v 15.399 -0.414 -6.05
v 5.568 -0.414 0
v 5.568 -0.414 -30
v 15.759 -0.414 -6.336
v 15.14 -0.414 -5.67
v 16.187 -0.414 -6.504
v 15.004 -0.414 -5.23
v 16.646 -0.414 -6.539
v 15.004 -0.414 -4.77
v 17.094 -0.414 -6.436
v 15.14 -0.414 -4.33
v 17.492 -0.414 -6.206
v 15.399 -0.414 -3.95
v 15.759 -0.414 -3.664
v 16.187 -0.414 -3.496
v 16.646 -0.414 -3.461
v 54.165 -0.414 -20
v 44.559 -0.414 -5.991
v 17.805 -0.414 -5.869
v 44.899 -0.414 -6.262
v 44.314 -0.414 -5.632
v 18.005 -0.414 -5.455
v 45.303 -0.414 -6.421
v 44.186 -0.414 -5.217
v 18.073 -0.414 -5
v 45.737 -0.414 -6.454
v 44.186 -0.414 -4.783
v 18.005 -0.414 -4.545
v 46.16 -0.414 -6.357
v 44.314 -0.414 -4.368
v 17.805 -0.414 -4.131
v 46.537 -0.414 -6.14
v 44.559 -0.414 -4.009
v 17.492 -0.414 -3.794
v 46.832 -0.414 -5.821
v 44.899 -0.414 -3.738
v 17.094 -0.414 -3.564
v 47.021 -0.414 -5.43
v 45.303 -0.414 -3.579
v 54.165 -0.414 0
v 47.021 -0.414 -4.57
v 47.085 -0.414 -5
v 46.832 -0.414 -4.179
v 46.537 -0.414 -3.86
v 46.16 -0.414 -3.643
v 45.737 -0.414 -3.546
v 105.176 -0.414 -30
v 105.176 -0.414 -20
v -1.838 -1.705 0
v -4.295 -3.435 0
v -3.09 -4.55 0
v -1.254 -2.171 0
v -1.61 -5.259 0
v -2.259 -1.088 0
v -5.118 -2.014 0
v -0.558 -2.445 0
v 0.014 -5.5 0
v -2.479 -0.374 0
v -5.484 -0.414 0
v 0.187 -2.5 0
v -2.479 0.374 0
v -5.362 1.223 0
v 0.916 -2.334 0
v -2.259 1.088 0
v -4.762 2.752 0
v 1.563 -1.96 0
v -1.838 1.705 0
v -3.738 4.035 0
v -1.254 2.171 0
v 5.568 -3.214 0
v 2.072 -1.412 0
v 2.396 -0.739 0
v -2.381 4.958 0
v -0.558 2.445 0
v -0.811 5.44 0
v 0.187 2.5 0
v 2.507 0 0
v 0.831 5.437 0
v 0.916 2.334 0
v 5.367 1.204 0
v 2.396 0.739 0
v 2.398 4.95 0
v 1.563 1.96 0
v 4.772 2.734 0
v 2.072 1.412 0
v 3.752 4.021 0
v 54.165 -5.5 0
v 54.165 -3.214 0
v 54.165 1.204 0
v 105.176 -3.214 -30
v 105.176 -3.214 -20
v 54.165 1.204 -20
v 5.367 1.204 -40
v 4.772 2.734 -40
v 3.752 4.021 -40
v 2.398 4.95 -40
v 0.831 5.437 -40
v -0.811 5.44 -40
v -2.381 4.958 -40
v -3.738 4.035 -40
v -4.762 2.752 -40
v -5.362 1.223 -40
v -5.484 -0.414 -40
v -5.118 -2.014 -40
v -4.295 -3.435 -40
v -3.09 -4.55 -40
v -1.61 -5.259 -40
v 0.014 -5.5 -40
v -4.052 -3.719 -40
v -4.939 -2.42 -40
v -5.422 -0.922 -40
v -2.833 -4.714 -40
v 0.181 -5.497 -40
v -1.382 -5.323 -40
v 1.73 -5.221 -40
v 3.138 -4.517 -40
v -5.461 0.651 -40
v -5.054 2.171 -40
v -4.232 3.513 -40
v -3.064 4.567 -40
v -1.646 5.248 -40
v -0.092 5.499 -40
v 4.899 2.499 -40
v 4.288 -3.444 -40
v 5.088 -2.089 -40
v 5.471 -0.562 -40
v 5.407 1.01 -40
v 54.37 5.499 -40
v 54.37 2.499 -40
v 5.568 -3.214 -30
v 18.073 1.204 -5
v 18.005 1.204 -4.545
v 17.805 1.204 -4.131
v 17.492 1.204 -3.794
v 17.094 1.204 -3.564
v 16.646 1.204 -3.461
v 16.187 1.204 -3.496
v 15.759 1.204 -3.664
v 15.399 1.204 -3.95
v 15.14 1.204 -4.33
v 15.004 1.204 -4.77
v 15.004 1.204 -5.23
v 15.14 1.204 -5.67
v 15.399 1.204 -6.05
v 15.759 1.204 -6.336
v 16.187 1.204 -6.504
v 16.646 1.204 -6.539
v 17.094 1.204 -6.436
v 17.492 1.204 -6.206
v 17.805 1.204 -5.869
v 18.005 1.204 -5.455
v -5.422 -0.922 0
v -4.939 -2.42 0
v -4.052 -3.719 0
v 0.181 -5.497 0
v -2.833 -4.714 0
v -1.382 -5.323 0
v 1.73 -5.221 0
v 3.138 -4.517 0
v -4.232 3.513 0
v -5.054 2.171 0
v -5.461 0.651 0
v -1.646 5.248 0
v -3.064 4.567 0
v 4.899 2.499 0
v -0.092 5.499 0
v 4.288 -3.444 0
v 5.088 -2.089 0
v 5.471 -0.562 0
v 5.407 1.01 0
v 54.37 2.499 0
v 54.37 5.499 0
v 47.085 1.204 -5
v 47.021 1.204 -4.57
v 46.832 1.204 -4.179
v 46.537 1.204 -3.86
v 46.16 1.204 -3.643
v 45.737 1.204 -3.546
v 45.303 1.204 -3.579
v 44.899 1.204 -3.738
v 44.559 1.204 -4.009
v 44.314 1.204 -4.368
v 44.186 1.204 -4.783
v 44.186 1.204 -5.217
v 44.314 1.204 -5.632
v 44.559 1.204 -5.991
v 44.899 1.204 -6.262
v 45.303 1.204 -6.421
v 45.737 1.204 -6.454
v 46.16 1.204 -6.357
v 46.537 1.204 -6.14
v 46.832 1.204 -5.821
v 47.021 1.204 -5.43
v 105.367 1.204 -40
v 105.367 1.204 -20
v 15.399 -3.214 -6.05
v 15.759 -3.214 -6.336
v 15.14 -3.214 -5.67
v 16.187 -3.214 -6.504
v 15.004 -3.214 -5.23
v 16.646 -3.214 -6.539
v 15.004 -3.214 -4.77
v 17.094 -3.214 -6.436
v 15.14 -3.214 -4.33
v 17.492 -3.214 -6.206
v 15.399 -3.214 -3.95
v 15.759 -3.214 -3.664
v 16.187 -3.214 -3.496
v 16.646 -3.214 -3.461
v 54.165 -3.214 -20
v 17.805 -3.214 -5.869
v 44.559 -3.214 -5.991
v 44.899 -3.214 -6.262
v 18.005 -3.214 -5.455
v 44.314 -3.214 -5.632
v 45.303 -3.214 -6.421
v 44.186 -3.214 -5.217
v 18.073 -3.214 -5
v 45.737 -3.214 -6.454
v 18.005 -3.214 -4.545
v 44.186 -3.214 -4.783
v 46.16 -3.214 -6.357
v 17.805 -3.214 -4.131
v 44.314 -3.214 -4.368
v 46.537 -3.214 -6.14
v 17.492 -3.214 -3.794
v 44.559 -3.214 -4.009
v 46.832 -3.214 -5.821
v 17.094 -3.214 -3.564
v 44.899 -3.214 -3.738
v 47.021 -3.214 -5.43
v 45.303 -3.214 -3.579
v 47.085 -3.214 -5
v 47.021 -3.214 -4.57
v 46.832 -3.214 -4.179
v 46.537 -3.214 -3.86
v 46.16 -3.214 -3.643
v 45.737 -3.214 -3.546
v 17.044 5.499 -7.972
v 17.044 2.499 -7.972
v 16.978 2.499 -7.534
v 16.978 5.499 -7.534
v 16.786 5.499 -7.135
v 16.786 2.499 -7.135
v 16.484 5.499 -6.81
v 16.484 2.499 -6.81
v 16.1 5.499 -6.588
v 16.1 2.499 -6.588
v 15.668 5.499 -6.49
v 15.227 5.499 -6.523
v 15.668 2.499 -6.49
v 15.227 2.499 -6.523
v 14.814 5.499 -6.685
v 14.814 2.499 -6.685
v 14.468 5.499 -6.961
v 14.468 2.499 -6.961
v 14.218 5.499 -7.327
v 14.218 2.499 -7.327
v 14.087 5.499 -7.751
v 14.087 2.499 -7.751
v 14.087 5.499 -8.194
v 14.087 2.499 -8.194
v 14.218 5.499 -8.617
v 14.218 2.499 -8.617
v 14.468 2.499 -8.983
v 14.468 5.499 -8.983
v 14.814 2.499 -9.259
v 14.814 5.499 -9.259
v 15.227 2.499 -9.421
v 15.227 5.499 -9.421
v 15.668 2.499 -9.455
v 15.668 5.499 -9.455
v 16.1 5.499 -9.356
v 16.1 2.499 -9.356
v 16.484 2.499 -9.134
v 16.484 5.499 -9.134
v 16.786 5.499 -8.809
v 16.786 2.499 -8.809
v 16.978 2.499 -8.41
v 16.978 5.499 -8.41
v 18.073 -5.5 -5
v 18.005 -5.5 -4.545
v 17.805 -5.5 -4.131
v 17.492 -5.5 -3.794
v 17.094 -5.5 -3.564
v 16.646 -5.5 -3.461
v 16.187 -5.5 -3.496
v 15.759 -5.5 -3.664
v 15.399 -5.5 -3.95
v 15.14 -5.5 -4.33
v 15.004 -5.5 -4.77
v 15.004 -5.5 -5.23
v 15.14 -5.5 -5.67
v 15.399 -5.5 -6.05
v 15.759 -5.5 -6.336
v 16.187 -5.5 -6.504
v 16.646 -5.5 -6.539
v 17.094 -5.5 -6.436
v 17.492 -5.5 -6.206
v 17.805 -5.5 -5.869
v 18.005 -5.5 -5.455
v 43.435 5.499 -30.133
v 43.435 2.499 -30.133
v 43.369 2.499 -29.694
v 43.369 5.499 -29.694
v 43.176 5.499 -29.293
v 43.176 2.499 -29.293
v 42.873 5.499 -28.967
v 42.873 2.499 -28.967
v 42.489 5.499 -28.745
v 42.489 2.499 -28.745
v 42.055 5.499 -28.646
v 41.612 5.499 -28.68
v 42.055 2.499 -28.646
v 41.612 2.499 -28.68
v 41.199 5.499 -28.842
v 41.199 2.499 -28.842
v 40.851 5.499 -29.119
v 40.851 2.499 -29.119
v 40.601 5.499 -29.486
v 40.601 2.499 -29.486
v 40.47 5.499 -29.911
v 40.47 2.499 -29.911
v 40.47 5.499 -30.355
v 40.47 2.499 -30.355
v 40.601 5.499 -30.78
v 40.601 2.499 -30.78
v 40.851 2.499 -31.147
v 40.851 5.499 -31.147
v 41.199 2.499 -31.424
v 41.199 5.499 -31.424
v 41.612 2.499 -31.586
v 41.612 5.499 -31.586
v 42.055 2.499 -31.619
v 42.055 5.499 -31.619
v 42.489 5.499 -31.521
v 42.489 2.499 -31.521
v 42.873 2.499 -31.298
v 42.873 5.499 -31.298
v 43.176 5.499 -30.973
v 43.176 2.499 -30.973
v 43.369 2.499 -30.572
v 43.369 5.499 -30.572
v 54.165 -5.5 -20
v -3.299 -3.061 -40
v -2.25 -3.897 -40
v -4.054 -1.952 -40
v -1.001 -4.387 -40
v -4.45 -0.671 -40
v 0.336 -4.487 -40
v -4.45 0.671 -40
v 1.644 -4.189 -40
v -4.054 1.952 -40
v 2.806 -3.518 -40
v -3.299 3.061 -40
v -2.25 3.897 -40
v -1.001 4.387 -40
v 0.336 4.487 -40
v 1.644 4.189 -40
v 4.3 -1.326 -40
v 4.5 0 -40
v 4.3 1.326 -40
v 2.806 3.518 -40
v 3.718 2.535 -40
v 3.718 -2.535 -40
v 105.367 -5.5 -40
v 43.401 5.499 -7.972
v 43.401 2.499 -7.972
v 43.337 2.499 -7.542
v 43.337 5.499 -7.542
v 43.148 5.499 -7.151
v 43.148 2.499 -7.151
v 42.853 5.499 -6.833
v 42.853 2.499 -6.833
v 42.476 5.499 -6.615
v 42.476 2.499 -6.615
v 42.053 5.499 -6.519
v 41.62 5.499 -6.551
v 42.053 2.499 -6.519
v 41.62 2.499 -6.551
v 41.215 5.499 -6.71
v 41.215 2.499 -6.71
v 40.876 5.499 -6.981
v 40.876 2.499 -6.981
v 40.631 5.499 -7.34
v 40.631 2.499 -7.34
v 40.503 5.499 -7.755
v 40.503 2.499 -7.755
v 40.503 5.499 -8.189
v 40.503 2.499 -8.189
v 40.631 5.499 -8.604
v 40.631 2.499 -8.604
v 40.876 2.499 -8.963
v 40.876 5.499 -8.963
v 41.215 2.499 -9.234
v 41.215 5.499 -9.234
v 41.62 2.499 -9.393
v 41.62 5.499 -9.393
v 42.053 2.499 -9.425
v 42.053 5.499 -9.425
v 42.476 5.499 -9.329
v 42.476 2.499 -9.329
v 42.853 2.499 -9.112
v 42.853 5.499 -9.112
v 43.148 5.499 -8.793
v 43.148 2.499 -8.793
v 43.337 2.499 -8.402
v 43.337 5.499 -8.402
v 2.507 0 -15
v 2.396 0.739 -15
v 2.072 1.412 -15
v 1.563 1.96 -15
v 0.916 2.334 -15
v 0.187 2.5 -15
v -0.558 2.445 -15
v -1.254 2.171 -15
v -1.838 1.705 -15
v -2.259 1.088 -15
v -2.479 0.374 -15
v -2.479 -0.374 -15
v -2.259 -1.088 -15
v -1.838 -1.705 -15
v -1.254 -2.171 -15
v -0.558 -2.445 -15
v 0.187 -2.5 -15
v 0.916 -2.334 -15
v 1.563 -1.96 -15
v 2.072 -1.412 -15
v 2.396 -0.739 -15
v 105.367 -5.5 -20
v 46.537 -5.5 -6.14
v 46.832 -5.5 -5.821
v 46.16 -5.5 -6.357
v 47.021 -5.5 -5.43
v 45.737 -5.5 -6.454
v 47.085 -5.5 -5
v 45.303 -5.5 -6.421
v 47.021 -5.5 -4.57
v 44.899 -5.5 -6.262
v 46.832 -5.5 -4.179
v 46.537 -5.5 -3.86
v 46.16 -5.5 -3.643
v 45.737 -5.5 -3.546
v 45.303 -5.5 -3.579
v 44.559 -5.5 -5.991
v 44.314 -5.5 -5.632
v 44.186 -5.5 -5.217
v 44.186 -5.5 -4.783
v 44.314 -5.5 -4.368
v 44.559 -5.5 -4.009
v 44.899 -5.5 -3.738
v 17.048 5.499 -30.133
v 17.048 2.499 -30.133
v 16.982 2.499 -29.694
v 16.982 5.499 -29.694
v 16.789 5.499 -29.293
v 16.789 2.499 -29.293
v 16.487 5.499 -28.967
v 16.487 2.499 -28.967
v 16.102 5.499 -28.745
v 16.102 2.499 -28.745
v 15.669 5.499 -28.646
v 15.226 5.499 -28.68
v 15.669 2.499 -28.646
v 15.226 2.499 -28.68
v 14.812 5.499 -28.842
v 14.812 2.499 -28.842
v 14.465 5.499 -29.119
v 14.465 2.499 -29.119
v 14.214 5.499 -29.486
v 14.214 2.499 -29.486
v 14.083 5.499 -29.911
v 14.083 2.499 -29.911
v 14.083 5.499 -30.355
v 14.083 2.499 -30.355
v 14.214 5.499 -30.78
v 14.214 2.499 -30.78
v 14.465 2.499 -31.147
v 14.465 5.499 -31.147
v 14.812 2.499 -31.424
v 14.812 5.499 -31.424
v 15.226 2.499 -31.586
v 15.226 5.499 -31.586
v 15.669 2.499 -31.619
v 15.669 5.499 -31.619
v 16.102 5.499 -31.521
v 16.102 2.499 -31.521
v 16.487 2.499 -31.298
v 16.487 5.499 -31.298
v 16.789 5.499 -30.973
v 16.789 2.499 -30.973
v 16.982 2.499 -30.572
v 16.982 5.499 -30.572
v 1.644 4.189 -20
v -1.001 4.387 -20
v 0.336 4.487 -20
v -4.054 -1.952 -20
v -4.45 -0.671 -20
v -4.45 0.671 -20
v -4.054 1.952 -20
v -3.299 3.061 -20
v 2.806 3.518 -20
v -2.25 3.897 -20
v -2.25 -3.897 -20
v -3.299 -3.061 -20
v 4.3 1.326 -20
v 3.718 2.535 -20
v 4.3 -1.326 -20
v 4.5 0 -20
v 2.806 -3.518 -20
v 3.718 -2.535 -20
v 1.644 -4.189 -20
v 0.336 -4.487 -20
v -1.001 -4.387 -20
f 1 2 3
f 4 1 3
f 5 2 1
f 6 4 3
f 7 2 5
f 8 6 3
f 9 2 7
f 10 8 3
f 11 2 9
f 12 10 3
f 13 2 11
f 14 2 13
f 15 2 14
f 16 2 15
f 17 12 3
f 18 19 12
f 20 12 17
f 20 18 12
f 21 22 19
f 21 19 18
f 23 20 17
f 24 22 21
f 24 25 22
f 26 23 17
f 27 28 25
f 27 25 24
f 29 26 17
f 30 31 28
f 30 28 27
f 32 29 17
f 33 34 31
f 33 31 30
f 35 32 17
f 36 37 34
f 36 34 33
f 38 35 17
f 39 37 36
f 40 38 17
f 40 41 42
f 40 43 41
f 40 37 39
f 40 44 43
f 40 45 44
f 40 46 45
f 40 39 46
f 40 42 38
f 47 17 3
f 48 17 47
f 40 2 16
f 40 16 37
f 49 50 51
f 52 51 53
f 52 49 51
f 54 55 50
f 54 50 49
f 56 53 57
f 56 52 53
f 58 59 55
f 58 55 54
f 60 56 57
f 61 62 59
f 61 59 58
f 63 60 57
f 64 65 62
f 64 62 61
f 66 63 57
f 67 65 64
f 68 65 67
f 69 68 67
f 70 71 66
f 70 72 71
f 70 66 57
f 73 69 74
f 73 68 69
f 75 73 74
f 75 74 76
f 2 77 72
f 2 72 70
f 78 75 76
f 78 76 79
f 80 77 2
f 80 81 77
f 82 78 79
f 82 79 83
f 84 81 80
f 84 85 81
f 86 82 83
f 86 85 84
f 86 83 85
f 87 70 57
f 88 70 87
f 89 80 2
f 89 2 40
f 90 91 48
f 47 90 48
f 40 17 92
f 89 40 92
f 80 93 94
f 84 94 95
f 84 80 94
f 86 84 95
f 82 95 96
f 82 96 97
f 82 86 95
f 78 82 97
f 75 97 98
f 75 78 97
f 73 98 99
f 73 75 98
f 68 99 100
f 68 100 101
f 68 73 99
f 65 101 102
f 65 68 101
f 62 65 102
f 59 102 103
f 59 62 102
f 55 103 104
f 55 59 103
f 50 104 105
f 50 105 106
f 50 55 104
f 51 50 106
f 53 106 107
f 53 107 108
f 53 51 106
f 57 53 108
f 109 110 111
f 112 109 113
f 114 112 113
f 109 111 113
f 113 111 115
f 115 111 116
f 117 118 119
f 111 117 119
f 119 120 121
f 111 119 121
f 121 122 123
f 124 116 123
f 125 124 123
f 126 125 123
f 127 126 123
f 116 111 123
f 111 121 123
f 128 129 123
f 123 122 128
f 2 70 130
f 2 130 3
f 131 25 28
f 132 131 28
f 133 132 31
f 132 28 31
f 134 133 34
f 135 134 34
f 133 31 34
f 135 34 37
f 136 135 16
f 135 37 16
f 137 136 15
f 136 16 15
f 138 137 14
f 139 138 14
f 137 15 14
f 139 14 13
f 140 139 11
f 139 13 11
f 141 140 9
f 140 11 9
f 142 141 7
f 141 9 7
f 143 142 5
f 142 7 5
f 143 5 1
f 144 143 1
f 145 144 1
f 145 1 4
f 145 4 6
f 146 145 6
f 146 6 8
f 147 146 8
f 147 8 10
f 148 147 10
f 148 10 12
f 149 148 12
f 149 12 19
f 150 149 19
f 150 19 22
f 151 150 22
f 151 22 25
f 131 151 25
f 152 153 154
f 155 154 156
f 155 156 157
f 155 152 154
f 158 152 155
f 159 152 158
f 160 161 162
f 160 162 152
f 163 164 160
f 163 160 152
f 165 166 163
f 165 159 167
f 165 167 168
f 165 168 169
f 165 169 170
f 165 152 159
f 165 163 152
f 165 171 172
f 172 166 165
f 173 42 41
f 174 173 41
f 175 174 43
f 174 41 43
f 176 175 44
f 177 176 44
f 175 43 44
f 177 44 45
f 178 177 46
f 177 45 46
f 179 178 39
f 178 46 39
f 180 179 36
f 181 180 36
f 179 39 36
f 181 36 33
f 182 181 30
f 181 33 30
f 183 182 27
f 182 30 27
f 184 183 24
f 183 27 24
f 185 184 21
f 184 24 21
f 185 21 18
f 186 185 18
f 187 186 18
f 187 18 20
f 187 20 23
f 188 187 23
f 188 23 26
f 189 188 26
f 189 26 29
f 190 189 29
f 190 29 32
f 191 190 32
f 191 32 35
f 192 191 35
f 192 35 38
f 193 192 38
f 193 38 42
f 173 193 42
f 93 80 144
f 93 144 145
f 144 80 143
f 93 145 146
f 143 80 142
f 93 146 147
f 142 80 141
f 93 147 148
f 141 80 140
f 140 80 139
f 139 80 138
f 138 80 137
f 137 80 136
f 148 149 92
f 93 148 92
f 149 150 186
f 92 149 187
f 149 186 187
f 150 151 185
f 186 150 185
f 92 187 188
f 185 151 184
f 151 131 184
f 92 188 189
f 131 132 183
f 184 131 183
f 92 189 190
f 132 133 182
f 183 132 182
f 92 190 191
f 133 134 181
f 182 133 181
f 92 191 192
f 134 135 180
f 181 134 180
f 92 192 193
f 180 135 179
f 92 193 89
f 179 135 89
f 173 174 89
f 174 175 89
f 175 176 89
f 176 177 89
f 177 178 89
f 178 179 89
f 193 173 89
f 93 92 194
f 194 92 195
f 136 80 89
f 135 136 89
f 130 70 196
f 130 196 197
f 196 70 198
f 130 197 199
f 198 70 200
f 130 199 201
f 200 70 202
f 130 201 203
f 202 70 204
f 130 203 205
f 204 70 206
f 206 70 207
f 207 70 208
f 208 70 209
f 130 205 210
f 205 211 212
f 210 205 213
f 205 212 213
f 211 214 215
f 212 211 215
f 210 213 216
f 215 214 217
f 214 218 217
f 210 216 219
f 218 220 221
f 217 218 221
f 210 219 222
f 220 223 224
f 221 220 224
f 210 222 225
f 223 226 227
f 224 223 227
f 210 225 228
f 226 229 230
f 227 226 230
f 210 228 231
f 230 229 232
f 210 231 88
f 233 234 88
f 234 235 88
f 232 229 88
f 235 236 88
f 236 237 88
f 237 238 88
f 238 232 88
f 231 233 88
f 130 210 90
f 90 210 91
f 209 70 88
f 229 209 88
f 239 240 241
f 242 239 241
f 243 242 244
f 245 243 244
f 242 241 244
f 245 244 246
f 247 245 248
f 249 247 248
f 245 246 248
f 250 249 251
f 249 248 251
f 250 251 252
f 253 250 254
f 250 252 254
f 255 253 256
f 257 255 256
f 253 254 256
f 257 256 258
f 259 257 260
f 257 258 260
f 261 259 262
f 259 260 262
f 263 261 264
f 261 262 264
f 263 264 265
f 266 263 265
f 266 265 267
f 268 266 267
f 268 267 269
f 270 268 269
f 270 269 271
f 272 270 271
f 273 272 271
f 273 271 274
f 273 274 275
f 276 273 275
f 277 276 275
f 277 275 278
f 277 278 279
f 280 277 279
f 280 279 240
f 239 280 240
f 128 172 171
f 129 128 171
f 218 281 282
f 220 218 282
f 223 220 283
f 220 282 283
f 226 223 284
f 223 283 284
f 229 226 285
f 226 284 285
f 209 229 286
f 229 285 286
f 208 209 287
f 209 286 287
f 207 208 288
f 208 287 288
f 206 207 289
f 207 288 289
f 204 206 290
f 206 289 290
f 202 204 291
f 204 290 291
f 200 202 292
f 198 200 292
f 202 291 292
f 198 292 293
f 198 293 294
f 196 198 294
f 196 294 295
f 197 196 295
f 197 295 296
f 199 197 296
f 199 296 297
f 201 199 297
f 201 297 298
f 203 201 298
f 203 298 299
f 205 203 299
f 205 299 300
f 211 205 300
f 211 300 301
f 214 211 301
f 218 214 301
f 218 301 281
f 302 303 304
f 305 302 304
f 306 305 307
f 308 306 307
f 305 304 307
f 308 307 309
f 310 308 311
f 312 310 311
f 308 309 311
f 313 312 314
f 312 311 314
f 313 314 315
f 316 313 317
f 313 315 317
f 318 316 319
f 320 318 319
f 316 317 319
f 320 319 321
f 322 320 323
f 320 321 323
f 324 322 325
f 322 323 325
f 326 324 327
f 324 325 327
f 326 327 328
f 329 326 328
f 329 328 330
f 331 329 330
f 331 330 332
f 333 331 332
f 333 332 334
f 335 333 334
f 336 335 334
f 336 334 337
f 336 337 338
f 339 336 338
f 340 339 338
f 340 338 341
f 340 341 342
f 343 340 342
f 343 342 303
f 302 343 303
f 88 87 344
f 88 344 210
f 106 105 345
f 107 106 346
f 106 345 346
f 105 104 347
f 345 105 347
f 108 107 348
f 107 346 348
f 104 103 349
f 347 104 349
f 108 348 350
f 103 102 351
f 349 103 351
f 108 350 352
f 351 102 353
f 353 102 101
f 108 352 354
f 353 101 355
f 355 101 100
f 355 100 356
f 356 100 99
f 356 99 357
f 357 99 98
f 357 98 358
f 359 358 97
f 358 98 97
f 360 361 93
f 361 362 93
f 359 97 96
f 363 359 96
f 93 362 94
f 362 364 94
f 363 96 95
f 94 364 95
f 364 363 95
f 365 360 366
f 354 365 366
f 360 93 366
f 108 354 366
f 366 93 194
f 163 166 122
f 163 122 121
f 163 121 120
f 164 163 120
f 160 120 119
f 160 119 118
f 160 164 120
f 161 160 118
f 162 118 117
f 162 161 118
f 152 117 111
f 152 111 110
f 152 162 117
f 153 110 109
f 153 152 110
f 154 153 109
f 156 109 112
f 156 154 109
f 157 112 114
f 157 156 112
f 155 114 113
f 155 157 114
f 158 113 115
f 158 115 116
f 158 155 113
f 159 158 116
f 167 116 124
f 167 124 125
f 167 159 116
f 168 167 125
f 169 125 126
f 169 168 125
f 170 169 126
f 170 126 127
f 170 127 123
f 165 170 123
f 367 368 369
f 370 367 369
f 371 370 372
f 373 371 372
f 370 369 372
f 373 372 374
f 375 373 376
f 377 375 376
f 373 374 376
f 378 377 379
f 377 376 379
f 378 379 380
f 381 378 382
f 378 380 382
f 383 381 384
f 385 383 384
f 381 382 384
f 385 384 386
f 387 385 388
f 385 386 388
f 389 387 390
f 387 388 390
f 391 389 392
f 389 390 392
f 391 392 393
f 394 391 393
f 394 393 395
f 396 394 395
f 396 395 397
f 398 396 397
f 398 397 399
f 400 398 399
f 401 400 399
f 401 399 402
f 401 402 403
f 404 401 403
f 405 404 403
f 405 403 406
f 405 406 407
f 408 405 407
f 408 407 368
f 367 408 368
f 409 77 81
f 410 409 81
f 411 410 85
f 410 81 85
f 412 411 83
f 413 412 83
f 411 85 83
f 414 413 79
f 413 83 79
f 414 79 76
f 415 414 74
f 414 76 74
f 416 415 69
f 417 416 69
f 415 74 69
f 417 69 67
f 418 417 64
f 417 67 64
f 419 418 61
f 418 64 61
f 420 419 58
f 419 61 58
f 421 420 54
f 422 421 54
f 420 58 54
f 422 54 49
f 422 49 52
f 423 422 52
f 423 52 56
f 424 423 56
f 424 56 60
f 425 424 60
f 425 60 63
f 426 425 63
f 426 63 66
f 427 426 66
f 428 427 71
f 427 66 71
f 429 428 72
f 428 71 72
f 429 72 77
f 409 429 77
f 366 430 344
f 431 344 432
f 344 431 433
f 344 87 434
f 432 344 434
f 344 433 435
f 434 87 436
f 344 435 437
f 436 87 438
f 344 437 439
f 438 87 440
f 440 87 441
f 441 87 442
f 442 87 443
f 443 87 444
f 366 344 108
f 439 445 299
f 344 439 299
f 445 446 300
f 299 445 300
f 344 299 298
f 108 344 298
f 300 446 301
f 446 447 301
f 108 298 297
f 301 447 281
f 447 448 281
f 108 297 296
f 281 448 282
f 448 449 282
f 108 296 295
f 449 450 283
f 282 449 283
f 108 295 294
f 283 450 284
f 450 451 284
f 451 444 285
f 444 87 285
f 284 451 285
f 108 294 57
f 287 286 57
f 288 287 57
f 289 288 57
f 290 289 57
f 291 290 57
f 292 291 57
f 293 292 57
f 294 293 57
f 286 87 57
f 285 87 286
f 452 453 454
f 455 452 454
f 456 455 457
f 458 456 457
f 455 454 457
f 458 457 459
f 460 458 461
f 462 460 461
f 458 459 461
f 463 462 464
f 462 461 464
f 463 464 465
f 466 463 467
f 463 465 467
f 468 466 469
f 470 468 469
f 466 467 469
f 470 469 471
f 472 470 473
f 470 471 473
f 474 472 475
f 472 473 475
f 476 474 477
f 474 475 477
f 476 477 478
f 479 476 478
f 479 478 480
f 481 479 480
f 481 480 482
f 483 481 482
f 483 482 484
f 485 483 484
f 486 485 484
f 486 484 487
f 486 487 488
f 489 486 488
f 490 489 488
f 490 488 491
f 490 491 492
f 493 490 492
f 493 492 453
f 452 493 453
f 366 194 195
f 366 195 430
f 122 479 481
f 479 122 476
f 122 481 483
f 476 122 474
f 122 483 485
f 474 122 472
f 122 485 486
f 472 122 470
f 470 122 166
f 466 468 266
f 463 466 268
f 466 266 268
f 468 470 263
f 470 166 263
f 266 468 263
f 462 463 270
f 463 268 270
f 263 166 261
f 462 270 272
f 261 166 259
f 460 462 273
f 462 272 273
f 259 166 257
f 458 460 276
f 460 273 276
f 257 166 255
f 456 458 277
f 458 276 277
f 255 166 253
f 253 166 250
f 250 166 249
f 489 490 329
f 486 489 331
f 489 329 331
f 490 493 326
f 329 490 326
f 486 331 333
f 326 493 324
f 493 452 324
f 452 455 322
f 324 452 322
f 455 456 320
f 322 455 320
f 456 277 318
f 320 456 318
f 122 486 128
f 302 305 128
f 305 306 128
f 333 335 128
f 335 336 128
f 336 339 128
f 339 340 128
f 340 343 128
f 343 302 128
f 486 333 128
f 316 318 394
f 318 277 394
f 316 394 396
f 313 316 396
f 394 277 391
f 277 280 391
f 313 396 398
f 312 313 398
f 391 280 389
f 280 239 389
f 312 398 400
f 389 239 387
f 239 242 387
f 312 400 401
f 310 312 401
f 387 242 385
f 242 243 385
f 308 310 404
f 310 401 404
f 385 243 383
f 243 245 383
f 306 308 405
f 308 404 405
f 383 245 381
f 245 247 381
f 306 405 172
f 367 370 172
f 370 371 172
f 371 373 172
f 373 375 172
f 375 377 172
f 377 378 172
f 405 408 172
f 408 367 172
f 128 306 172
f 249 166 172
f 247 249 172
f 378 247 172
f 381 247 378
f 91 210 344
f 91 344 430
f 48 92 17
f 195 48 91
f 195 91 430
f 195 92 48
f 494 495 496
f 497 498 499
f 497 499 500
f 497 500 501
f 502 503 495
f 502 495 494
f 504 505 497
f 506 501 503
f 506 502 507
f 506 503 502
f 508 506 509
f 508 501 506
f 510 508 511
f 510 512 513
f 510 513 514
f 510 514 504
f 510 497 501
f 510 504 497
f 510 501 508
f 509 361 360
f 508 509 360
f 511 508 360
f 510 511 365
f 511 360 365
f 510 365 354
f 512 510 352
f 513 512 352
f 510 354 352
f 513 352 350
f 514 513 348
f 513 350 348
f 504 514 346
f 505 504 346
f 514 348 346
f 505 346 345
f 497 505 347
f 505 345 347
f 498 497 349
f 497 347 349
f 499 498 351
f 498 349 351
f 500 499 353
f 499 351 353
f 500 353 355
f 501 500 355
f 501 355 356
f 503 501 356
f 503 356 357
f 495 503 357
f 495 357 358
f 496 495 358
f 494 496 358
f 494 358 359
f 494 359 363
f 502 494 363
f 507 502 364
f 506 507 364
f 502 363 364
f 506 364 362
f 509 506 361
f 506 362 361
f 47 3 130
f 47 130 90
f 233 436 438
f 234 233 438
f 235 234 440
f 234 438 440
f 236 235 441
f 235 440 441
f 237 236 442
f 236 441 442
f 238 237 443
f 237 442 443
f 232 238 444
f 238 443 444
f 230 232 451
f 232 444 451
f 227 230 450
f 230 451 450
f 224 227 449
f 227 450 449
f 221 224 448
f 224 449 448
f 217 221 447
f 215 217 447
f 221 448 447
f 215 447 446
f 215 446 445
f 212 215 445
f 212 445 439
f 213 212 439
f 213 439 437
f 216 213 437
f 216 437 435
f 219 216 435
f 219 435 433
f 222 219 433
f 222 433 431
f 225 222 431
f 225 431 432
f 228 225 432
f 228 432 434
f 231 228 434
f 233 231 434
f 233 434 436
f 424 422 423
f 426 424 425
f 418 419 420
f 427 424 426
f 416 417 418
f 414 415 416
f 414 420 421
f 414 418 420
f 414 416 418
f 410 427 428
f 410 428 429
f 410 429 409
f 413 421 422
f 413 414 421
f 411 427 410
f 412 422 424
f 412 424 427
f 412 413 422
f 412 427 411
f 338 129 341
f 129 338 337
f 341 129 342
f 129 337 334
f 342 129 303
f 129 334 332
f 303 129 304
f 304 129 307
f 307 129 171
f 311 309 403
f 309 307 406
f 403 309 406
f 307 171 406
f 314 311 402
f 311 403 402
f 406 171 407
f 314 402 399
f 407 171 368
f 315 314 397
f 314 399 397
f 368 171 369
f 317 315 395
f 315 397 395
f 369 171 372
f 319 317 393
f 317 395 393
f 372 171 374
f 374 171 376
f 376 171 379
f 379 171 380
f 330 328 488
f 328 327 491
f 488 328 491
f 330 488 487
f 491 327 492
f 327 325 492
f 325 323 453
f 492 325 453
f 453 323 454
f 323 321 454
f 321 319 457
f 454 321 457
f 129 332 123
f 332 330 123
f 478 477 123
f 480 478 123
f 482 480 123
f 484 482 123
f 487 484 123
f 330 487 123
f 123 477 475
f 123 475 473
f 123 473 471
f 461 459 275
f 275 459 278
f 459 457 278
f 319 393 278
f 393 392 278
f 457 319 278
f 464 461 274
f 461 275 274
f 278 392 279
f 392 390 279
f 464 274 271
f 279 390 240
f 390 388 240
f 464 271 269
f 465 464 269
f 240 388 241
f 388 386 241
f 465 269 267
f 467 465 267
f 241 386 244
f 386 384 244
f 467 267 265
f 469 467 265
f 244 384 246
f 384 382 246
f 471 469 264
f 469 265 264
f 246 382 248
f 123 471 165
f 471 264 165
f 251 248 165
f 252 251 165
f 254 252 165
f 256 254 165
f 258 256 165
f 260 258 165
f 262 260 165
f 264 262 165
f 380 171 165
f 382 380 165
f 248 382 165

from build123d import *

# Parameters (mm, degrees)
PAD_DEPTH       = 40
SKETCH006_R     = 1.486591
SKETCH006_R_2   = 1.457401
SKETCH006_R_3   = 1.490716
SKETCH006_R_4   = 1.490718
POCKET004_DEPTH = 3.001
PAD001_DEPTH    = 40
SKETCH002_R     = 4.5
POCKET_DEPTH    = 20
SKETCH003_R     = 2.507414
POCKET001_DEPTH = 15
SKETCH004_W     = 51.202057
SKETCH004_H     = 6.85388
POCKET002_DEPTH = 20
SKETCH005_W     = 99.607782
SKETCH005_H     = 2.8
POCKET003_DEPTH = 30
SKETCH007_R     = 1.543073
SKETCH007_R_2   = 1.45762
POCKET005_DEPTH = 11.000981


with BuildPart() as cerniera_fissa_buchi:
    # Sketch → Pad (new body)
    with BuildSketch(Plane.XY):
        with BuildLine():
            ThreePointArc((-0.092333, 5.499225), (-2.833181, -4.714137), (4.899375, 2.499225))
            Line((54.370086, 2.499225), (4.899375, 2.499225))
            Line((54.370086, 5.499225), (54.370086, 2.499225))
            Line((-0.092333, 5.499225), (54.370086, 5.499225))
        make_face()
    extrude(amount=-PAD_DEPTH)

    # Sketch006 → Pocket004 (cut, through all)
    with BuildSketch(Plane.XZ.offset(-2.499225)):
        with Locations((15.557346, -7.972067)):
            Circle(SKETCH006_R)
        with Locations((41.944046, -7.972067)):
            Circle(SKETCH006_R_2)
        with Locations((15.557346, -30.132898)):
            Circle(SKETCH006_R_3)
        with Locations((41.944046, -30.132898)):
            Circle(SKETCH006_R_4)
    extrude(amount=-POCKET004_DEPTH, mode=Mode.SUBTRACT)


with BuildPart() as pocket005:
    # Sketch001 → Pad001 (new body)
    with BuildSketch(Plane.XY):
        with BuildLine():
            ThreePointArc((5.366596, 1.204012), (-4.298245, 3.431485), (0.014494, -5.499981))
            Line((105.366596, -5.499981), (0.014494, -5.499981))
            Line((105.366596, 1.204012), (105.366596, -5.499981))
            Line((5.366596, 1.204012), (105.366596, 1.204012))
        make_face()
    extrude(amount=-PAD001_DEPTH)

    # Sketch002 → Pocket (cut)
    with BuildSketch(Plane(origin=(0, 0, -40), x_dir=(1, 0, 0), z_dir=(0, 0, -1))):
        Circle(SKETCH002_R)
    extrude(amount=-POCKET_DEPTH, mode=Mode.SUBTRACT)

    # Sketch003 → Pocket001 (cut)
    with BuildSketch(Plane.XY):
        Circle(SKETCH003_R)
    extrude(amount=-POCKET001_DEPTH, mode=Mode.SUBTRACT)

    # Sketch004 → Pocket002 (cut)
    with BuildSketch(Plane.XY):
        with Locations((79.765568, -2.222928)):
            Rectangle(SKETCH004_W, SKETCH004_H)
    extrude(amount=-POCKET002_DEPTH, mode=Mode.SUBTRACT)

    # Sketch005 → Pocket003 (cut)
    with BuildSketch(Plane.XY):
        with Locations((55.371944, -1.813809)):
            Rectangle(SKETCH005_W, SKETCH005_H)
    extrude(amount=-POCKET003_DEPTH, mode=Mode.SUBTRACT)

    # Sketch007 → Pocket005 (cut, through all)
    with BuildSketch(Plane.XZ.offset(5.499981)):
        with Locations((88.258736, -5)):
            Circle(SKETCH007_R)
        with Locations((16.530338, -5)):
            Circle(SKETCH007_R)
        with Locations((45.627708, -5)):
            Circle(SKETCH007_R_2)
    extrude(amount=-POCKET005_DEPTH, mode=Mode.SUBTRACT)


solid = Compound([cerniera_fissa_buchi.part, pocket005.part])
